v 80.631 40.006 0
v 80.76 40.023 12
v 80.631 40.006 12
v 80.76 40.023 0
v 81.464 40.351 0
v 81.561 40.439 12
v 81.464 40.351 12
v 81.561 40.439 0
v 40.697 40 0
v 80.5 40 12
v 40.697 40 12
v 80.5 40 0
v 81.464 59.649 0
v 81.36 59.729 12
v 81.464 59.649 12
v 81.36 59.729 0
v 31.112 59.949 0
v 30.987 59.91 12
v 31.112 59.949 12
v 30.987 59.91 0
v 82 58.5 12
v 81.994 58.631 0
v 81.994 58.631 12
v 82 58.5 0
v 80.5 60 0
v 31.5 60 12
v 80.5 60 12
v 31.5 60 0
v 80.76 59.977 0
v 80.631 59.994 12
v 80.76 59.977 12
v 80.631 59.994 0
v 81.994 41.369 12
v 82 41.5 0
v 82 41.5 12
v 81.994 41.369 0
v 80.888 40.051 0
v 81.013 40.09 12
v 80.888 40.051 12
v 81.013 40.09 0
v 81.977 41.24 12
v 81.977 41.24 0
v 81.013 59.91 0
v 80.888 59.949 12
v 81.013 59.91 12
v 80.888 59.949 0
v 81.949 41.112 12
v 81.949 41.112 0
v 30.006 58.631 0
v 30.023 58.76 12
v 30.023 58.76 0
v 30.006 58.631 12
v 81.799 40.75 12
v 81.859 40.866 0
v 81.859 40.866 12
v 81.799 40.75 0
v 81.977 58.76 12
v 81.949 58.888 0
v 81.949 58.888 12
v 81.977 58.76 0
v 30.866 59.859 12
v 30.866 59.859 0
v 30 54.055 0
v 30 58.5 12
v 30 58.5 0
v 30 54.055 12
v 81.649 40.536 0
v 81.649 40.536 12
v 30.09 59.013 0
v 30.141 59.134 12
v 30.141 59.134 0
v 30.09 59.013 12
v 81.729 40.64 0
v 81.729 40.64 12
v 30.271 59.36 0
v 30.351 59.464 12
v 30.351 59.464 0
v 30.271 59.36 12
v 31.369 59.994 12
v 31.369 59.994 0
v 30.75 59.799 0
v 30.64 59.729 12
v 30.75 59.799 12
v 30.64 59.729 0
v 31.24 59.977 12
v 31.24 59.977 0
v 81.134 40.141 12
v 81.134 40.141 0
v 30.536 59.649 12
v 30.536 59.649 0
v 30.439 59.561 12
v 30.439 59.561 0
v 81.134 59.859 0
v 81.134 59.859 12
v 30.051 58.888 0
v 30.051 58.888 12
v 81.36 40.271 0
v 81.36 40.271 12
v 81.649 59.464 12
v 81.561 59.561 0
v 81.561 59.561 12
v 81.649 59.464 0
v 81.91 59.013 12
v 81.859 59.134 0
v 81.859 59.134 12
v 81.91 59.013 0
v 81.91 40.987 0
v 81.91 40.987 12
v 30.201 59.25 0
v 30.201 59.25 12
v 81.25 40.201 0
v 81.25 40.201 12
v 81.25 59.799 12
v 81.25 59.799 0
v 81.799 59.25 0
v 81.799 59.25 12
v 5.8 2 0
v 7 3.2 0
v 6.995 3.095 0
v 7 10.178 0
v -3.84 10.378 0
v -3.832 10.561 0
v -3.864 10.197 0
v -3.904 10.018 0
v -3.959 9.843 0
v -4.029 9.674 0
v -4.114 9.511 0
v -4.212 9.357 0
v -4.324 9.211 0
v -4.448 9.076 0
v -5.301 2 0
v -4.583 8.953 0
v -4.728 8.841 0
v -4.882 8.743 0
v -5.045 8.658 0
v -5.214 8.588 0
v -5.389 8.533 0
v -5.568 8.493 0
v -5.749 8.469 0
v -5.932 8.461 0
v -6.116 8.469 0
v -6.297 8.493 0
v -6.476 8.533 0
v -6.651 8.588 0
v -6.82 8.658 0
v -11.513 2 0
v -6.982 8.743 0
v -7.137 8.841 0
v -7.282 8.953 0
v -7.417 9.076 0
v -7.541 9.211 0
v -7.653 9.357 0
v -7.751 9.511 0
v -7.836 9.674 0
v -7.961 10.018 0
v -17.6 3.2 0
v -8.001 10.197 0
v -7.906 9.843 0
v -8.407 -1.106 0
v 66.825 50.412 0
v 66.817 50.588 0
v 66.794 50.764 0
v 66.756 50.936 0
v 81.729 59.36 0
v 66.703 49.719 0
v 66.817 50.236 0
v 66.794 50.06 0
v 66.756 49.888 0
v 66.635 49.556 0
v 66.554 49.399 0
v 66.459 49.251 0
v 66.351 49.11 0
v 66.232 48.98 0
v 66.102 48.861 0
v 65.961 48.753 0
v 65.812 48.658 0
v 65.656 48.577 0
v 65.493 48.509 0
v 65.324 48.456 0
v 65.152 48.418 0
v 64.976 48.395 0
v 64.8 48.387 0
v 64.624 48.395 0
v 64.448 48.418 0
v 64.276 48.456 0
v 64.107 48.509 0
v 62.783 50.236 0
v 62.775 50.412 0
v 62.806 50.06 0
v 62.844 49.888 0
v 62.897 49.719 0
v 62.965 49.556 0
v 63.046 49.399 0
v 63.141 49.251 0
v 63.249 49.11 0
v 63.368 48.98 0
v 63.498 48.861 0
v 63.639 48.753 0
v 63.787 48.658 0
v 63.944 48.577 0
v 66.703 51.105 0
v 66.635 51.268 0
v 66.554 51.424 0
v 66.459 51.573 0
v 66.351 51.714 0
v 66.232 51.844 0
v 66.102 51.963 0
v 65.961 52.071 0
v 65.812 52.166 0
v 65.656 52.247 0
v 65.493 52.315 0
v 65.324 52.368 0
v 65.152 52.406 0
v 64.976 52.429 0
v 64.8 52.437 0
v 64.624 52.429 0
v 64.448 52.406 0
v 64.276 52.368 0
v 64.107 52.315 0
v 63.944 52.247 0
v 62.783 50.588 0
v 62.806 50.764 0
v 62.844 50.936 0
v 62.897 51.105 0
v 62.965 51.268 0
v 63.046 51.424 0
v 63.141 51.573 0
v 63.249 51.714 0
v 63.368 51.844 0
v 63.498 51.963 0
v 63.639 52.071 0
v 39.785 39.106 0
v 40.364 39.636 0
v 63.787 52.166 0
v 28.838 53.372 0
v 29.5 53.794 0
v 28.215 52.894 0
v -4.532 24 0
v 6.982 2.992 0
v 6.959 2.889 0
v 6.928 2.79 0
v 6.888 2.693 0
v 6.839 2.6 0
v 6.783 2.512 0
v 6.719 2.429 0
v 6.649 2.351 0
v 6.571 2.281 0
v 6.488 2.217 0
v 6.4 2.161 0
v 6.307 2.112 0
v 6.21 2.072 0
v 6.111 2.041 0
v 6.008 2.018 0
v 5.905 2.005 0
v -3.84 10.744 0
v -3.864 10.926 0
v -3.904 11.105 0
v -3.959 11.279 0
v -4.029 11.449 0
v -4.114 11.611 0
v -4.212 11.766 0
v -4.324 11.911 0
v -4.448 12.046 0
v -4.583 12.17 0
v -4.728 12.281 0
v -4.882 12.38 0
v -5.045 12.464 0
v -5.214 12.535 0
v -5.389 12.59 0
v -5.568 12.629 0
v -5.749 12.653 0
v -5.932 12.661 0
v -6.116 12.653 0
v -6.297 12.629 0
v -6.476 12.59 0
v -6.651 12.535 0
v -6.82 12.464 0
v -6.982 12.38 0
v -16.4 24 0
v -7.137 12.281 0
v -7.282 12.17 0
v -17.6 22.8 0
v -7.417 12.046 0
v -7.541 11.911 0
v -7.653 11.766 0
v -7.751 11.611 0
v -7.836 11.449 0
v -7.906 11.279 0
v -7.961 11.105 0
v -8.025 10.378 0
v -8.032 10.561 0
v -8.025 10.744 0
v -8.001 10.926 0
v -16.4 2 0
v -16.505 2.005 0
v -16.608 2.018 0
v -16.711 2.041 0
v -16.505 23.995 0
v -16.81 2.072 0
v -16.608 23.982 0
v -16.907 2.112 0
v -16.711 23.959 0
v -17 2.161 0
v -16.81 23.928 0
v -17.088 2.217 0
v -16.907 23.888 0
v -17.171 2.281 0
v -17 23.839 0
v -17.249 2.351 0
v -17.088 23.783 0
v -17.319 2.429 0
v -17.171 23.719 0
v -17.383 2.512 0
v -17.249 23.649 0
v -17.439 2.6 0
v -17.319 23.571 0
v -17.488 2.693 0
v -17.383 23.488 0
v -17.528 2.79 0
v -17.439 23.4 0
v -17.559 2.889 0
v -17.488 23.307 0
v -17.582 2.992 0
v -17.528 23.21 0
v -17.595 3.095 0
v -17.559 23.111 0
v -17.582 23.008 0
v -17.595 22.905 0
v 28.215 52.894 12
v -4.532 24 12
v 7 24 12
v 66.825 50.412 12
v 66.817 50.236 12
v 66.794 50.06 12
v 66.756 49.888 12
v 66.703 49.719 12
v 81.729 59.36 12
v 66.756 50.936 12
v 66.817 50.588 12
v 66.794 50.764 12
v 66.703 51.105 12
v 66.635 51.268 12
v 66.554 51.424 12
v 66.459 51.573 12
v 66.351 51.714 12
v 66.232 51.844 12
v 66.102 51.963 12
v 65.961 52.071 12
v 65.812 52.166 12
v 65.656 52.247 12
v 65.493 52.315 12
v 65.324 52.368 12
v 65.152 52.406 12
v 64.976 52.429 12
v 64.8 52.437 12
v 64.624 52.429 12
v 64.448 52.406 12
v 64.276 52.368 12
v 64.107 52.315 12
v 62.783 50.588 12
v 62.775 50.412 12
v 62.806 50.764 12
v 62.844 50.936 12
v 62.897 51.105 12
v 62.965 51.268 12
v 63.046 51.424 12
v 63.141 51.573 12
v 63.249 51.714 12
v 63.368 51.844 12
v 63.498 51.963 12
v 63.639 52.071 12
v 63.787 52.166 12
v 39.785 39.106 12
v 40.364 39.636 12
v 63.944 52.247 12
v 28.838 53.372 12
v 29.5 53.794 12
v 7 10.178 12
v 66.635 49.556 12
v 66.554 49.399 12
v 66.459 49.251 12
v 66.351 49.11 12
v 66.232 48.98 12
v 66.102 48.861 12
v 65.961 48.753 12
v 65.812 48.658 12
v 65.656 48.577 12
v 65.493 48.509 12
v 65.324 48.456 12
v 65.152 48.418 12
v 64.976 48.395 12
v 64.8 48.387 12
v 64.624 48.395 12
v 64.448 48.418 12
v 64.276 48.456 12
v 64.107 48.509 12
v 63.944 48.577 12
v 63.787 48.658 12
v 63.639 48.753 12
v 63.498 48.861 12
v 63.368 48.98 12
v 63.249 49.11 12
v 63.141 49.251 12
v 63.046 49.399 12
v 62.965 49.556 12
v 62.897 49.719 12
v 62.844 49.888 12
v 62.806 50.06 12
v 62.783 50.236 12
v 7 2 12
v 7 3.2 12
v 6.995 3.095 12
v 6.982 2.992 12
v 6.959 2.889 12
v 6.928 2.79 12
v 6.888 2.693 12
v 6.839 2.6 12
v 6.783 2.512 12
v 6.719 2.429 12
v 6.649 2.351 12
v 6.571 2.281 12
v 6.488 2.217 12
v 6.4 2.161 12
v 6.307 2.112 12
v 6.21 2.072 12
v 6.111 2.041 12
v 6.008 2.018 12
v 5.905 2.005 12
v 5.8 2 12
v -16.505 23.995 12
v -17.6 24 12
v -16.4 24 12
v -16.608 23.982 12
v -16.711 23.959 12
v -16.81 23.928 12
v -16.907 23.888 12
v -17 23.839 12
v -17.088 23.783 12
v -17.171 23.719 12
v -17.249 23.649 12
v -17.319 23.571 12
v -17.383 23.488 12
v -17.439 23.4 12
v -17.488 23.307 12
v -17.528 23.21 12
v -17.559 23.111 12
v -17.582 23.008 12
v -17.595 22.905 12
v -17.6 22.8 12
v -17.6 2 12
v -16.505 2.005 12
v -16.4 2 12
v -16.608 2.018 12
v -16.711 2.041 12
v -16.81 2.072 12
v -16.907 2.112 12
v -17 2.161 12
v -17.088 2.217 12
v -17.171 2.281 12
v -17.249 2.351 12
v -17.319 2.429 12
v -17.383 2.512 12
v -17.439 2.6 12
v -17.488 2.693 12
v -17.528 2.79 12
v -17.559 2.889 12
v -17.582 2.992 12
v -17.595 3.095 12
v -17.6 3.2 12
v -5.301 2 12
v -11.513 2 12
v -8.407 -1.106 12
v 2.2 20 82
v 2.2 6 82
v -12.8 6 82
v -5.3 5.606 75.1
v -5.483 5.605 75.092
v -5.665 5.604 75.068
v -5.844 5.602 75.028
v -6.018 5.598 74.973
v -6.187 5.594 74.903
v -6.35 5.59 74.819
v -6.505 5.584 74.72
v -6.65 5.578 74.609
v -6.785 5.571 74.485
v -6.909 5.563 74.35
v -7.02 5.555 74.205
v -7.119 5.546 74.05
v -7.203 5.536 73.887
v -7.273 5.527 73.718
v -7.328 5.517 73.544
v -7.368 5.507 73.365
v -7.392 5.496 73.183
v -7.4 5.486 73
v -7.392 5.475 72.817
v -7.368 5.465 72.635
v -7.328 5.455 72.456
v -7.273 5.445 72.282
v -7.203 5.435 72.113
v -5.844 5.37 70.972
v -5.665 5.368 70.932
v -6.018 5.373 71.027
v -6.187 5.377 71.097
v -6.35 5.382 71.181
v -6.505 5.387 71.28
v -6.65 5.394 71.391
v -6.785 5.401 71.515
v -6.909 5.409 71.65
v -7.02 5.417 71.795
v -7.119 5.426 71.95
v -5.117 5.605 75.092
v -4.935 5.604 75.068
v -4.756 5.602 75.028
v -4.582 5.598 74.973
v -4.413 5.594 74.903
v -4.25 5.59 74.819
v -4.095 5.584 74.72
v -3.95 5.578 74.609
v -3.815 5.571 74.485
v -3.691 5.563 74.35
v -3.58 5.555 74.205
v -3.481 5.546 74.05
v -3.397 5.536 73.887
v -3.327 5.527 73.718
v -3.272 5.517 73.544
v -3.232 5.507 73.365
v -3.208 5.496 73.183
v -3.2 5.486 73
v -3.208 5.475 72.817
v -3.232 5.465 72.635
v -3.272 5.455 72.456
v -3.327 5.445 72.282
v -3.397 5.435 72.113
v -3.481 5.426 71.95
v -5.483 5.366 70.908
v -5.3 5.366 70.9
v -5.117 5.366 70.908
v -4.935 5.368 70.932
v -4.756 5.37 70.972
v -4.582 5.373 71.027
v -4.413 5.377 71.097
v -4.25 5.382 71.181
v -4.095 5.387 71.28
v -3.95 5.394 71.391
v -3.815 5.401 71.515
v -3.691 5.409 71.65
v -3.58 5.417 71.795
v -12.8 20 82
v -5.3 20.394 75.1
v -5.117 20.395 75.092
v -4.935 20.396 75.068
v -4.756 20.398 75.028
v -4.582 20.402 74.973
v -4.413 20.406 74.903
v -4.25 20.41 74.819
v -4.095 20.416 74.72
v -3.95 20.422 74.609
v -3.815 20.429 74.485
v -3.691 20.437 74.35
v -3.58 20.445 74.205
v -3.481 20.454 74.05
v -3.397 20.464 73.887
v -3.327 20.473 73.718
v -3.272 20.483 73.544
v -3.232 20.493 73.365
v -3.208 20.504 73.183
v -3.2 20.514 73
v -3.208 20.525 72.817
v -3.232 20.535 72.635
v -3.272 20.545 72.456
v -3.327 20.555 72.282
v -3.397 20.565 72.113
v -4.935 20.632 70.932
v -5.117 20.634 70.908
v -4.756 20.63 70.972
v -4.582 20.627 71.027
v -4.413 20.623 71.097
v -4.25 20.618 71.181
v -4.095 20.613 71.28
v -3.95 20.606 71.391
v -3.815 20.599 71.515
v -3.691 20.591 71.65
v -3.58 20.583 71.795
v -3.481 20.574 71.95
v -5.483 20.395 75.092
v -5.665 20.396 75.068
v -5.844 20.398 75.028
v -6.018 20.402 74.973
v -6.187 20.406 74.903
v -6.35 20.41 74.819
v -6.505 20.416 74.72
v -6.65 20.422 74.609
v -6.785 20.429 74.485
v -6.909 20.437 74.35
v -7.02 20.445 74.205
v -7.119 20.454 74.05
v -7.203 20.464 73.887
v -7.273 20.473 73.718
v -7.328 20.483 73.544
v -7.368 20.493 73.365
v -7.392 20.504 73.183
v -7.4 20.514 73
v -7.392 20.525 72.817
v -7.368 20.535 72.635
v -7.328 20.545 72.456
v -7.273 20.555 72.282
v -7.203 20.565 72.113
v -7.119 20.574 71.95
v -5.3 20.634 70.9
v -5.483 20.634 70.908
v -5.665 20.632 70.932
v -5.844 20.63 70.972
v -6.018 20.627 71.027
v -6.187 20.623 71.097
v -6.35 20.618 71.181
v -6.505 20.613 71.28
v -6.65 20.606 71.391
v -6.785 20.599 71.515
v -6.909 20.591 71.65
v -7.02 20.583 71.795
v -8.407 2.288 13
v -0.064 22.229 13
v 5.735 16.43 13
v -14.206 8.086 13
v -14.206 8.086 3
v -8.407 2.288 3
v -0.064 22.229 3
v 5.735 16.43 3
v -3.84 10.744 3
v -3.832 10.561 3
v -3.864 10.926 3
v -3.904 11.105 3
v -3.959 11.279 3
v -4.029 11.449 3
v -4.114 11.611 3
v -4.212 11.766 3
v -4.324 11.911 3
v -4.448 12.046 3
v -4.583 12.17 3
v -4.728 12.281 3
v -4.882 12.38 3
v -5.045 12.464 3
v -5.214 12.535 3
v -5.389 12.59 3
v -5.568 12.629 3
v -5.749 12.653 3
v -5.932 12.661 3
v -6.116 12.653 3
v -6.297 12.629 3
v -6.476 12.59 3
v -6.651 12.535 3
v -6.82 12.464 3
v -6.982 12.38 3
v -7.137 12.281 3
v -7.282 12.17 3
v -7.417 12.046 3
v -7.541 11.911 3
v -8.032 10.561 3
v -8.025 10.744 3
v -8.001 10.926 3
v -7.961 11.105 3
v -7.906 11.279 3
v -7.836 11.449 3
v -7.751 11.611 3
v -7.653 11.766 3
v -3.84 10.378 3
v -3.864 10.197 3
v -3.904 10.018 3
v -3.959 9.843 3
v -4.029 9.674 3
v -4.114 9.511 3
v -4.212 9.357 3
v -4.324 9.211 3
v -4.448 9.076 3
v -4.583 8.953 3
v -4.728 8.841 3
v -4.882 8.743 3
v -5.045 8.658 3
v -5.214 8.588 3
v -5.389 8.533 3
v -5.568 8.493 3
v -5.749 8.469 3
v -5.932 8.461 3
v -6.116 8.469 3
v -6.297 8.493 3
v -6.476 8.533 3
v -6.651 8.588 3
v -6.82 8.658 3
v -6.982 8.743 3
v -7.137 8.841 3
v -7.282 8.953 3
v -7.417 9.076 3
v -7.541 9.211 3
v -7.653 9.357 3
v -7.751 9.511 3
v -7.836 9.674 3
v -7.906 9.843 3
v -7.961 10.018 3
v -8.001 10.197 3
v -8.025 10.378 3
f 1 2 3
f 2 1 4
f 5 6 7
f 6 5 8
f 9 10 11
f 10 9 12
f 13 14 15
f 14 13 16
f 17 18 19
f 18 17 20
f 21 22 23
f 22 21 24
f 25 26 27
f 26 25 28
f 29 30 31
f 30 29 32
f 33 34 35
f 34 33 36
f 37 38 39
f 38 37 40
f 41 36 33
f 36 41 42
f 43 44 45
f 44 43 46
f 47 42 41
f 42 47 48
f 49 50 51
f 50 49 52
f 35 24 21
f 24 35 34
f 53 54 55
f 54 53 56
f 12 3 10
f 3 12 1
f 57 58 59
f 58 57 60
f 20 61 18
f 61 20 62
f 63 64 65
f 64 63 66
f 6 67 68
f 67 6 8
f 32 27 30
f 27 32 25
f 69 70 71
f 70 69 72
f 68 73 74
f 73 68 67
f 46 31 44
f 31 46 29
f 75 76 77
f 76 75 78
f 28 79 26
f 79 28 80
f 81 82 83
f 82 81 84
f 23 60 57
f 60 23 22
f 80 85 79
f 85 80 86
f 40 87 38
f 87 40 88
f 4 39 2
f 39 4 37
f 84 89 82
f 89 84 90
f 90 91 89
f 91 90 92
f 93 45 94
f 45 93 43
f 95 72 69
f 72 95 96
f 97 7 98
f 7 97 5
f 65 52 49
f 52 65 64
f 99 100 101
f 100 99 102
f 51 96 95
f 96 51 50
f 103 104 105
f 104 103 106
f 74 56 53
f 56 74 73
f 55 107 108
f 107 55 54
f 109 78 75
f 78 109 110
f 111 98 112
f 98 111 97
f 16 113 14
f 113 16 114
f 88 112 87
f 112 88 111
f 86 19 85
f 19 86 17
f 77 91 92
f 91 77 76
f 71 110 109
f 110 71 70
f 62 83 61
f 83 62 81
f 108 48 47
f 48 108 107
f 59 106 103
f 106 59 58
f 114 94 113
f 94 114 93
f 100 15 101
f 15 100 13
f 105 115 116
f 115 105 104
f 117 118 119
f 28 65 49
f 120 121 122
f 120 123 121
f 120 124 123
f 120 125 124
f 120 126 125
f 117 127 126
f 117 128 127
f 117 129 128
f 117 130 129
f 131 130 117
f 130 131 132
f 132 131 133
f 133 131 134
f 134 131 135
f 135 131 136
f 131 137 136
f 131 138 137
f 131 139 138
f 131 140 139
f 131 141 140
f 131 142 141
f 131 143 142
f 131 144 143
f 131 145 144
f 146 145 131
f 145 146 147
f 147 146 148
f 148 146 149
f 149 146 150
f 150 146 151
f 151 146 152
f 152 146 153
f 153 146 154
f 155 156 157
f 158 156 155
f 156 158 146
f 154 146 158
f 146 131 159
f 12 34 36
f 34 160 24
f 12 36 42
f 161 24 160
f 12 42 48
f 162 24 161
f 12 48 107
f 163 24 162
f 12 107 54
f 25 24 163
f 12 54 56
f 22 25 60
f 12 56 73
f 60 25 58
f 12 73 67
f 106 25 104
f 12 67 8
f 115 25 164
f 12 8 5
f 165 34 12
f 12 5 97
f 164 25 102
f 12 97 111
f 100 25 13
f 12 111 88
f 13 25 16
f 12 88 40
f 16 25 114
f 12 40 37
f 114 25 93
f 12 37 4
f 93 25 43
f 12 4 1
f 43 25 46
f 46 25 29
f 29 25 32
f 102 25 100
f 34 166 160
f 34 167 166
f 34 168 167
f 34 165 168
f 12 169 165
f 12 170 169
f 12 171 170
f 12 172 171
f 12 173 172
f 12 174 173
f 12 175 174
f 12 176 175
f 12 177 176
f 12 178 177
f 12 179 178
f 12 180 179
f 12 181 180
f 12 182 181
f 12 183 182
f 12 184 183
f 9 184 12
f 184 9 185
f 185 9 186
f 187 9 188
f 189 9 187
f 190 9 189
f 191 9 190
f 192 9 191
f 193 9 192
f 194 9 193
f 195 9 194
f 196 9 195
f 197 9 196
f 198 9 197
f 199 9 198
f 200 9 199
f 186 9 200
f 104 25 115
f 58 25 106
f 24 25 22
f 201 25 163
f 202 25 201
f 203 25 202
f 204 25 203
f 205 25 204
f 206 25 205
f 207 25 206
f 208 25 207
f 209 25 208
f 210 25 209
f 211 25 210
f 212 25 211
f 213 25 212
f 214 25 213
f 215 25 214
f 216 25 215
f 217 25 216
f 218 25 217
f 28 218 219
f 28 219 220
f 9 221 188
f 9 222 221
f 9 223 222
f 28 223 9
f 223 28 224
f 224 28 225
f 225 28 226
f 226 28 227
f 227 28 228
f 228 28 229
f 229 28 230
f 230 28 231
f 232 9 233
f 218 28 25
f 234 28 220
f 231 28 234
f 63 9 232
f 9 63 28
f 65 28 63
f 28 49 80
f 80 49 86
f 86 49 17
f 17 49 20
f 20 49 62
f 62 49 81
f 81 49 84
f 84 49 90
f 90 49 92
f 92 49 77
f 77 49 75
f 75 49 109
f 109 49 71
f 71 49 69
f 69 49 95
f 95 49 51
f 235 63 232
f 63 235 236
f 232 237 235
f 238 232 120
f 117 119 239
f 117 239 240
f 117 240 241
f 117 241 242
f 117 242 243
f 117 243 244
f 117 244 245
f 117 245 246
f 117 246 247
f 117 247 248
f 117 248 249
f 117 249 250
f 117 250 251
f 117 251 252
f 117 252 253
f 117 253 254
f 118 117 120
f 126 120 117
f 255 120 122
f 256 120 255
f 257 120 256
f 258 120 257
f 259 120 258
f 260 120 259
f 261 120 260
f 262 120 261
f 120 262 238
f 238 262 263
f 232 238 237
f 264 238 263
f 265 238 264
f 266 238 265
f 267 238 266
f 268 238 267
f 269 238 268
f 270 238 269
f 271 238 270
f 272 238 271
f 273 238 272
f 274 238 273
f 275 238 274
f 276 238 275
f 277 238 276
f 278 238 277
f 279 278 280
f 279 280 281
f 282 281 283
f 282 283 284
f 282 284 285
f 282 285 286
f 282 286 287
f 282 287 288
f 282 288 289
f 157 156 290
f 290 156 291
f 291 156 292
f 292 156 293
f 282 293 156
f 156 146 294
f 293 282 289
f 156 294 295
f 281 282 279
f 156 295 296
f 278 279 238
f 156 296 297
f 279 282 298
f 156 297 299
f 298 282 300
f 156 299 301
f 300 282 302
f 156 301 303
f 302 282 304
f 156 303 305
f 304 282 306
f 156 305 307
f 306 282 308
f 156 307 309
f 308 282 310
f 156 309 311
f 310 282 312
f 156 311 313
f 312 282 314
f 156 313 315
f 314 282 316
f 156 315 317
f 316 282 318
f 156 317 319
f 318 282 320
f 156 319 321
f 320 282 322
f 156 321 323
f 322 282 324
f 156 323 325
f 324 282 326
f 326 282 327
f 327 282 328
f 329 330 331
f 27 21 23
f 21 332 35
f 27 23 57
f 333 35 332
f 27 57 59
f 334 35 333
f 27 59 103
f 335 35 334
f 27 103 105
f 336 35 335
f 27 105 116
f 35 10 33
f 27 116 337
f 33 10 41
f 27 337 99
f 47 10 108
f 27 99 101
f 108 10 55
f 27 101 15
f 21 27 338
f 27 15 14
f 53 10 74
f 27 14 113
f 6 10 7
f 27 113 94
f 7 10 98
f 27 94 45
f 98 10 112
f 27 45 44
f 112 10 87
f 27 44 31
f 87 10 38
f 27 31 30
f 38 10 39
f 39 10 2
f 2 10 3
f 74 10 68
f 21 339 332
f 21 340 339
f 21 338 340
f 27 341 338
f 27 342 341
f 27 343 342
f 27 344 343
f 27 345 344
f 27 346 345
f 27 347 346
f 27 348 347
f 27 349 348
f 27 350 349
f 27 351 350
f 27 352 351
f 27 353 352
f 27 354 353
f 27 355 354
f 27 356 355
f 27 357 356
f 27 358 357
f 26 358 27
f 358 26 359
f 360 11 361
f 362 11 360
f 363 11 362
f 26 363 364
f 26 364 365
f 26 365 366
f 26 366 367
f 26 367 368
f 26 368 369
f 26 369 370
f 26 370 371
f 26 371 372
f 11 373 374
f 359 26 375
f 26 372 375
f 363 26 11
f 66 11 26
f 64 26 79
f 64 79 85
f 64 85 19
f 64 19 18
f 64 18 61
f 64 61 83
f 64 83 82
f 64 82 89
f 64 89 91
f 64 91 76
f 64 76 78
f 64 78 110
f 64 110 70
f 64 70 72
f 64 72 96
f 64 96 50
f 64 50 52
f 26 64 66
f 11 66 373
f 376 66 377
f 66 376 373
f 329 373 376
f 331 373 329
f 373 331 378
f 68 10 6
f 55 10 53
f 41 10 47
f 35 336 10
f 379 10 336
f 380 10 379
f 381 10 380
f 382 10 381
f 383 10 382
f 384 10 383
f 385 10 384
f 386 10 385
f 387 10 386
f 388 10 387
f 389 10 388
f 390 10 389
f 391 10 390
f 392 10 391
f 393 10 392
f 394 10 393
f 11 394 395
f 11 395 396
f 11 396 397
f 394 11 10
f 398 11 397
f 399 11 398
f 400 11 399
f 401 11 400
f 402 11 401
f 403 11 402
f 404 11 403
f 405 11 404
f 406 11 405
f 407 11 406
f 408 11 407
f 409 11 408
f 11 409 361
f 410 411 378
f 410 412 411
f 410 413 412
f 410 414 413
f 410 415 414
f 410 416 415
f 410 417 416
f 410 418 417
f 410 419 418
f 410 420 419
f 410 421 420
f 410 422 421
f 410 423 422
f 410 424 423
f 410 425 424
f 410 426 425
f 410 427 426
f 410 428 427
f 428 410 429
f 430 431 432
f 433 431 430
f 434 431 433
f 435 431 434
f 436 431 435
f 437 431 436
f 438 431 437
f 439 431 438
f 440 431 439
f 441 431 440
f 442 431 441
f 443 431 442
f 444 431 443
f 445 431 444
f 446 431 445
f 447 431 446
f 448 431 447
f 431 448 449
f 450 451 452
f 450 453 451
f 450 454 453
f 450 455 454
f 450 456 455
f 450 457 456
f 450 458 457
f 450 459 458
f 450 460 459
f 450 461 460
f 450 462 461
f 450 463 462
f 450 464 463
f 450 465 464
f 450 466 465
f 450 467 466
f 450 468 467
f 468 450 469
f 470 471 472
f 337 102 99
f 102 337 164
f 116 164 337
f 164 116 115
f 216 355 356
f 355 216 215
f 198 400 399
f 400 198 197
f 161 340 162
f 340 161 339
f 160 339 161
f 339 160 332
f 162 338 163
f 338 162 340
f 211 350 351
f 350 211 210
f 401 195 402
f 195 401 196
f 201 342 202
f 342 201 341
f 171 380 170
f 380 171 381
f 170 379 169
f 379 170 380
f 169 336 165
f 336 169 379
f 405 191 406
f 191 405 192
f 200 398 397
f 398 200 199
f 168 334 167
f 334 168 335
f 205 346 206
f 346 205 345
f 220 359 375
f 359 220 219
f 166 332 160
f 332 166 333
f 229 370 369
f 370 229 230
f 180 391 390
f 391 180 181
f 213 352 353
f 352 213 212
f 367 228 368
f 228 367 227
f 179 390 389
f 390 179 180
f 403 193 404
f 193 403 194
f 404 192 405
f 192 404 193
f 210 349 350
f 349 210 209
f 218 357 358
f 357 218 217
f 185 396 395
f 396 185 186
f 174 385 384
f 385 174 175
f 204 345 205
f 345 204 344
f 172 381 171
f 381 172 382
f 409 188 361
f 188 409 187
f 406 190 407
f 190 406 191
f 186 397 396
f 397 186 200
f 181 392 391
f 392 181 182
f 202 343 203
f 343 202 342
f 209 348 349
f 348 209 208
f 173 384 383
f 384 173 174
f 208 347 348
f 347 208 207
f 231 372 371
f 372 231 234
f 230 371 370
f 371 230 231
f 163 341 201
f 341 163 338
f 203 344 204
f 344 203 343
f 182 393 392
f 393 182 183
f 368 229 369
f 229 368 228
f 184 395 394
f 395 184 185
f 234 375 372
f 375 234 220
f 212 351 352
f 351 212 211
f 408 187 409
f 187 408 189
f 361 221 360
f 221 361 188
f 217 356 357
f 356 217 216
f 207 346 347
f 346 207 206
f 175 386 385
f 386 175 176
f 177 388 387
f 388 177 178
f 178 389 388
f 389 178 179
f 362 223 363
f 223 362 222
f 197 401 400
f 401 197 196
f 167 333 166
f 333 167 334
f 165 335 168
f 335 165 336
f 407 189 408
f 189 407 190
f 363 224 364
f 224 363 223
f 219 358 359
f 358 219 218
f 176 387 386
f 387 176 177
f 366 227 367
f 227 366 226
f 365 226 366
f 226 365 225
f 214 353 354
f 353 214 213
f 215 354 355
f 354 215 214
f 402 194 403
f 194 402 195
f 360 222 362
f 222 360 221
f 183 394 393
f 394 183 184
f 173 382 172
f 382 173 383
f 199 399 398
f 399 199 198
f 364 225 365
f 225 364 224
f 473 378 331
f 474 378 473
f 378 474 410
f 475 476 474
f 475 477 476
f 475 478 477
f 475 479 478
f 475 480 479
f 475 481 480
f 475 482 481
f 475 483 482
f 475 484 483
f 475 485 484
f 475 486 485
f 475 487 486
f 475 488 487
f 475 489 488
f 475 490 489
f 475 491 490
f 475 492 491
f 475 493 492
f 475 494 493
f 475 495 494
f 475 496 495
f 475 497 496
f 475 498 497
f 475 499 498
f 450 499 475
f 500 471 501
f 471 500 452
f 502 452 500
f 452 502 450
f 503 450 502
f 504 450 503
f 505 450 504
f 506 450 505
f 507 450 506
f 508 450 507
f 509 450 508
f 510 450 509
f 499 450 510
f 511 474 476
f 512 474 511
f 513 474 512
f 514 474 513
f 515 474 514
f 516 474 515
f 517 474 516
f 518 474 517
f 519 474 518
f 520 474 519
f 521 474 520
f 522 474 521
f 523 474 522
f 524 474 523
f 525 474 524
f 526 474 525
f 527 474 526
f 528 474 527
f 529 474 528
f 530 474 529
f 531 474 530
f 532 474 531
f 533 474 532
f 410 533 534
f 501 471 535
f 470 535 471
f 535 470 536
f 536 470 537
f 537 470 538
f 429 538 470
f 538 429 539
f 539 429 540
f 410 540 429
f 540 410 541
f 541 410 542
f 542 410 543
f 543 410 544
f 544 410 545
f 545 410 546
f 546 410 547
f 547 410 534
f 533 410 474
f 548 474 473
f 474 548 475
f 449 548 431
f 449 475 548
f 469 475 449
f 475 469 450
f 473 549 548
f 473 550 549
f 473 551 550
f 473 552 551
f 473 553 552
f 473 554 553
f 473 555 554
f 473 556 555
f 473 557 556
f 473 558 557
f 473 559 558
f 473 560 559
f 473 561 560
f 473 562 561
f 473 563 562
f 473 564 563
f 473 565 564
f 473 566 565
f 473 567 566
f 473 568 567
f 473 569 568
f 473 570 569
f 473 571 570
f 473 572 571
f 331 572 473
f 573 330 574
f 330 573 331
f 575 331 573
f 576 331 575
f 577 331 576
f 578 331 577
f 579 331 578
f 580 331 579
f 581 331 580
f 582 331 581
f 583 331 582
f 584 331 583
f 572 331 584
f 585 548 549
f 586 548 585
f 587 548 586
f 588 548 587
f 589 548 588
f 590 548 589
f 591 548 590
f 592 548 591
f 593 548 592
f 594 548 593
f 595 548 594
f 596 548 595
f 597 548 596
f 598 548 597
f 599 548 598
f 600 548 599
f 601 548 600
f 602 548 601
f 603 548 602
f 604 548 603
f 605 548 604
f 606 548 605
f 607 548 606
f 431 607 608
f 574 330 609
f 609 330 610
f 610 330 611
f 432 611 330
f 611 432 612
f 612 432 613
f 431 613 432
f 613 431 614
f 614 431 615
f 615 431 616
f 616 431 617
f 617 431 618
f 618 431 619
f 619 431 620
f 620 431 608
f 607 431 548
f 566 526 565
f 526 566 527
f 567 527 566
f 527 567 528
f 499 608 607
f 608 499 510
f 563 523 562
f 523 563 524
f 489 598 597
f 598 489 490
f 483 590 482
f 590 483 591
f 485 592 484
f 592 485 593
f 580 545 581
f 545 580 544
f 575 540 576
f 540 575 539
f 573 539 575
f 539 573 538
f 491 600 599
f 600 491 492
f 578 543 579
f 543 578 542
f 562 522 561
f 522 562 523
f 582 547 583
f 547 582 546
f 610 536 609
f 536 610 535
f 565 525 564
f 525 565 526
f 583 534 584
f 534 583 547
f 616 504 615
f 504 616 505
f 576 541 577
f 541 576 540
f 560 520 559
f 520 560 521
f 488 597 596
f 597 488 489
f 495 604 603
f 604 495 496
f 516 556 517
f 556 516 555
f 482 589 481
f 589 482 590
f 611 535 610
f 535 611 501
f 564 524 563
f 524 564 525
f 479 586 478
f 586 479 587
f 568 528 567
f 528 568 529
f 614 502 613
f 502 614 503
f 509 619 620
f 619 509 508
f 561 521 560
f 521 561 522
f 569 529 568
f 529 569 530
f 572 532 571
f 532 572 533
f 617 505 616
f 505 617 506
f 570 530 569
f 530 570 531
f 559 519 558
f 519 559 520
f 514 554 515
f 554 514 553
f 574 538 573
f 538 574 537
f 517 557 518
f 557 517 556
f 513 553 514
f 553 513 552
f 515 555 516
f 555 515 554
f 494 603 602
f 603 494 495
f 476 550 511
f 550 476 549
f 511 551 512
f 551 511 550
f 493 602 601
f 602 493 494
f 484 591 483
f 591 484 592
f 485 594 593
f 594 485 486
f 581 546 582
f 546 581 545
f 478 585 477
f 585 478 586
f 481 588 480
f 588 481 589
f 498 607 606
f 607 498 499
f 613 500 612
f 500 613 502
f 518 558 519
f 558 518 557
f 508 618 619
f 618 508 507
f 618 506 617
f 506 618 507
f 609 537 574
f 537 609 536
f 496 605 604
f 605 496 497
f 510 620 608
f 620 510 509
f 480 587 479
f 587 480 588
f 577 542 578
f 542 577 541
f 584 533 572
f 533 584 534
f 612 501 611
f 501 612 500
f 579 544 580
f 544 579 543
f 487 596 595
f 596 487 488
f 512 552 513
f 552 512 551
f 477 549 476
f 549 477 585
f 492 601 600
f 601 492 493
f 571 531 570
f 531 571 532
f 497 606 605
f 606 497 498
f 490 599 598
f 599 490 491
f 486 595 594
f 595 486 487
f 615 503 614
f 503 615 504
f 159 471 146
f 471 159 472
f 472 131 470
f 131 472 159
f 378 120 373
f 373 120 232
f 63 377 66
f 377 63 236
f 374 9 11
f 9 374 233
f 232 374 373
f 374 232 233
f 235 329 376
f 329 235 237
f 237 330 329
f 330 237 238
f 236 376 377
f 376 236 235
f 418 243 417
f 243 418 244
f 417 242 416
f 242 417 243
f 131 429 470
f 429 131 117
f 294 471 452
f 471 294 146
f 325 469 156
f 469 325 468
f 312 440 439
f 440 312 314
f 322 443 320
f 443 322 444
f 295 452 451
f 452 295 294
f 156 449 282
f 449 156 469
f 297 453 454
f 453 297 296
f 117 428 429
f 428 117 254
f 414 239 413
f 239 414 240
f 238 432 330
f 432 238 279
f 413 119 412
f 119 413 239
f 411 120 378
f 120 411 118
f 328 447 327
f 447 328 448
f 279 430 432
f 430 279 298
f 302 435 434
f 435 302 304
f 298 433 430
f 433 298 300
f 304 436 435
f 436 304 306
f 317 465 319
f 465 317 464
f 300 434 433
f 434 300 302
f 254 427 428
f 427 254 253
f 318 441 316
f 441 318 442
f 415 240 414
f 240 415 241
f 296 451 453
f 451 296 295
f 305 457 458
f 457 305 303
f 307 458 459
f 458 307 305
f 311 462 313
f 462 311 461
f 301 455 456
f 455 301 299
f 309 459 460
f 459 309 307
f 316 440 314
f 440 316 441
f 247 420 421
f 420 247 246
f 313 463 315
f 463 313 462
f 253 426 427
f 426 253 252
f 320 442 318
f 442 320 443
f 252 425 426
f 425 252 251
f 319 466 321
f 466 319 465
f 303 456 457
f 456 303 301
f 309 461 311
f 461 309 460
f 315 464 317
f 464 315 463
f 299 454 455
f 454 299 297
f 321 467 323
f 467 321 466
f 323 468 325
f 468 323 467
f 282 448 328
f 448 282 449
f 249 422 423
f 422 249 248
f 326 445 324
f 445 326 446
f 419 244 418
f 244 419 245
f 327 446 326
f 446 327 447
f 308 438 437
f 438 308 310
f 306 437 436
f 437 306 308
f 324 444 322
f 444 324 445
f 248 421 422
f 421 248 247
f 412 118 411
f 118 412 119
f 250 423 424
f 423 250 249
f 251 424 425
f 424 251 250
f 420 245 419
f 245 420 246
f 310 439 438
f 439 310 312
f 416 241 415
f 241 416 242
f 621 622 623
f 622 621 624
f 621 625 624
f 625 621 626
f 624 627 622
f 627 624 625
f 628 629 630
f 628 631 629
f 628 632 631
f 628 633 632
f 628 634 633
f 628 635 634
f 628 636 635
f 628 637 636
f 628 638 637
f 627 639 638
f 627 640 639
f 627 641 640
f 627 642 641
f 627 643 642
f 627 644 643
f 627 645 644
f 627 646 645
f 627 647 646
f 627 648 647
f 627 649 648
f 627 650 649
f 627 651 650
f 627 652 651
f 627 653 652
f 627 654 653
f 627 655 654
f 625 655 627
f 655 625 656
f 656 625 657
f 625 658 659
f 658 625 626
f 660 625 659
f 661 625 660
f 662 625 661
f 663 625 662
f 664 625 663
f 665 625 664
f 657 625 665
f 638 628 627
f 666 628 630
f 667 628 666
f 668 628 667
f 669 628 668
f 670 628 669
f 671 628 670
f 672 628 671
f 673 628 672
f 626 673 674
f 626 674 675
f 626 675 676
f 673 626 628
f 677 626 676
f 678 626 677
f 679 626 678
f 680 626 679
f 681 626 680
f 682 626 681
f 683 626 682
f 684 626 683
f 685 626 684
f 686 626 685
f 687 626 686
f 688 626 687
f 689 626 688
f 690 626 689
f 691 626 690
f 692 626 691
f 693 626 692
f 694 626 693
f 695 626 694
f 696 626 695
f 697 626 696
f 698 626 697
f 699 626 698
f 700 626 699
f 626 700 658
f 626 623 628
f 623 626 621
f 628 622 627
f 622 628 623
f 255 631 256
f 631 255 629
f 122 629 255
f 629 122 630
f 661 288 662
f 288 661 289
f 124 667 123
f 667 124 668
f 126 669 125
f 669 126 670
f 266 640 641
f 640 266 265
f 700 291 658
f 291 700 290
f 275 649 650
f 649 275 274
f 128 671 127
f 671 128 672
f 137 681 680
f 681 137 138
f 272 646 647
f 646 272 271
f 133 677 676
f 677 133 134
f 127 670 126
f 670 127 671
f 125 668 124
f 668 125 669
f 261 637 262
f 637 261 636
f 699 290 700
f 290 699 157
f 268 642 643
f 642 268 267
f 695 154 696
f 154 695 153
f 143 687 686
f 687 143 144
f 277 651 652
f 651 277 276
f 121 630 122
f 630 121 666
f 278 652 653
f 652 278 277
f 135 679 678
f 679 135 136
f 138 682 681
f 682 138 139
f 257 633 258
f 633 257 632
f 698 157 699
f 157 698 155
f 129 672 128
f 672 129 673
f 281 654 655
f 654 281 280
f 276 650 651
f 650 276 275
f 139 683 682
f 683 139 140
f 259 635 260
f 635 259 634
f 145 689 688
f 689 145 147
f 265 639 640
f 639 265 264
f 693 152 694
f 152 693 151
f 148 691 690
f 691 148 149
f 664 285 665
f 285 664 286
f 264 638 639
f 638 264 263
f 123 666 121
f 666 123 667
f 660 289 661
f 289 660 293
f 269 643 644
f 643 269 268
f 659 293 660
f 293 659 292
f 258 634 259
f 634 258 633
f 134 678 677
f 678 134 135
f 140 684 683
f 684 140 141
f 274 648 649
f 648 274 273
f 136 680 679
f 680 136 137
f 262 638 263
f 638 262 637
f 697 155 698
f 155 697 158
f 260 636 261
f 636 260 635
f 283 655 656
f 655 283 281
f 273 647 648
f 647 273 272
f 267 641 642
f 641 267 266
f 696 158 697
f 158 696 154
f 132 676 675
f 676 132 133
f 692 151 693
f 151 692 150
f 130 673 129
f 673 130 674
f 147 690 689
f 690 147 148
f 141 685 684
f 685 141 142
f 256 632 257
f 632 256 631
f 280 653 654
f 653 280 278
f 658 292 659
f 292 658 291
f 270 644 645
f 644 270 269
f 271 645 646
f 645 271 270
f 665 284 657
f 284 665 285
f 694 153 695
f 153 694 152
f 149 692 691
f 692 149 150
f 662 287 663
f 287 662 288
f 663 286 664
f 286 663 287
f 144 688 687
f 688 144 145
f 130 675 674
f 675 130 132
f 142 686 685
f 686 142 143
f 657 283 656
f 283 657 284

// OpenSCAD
// Support_Cam_PI_IR_Cut_CR6_v6.scad
// Left CR-6 Pi IR-cut camera support bracket, rebuilt parametrically.
//
// This attempt intentionally focuses on the LEFT bracket only.  It does not
// import the STL.  v6 rebuilds the lower printer foot as the original channel/tray shape
// shown in the reference image, including walls, open pocket, and screw hole.

/* [Left Bracket Dimensions] */
base_z = 0;
base_thickness = 12;
diagonal_arm_width = 18;
diagonal_arm_start = [0, 16];
diagonal_arm_end = [34, 46];
camera_tab_origin = [30, 40, 0];
camera_tab_size = [52, 20, 12];
camera_hole_xy = [64.8, 50.412];
camera_hole_diameter = 4.05;
foot_center = [-5.9325, 10.56125];
foot_outer_size = [20, 13, 12];
foot_rotation = 45;
foot_wall = 2.4;
foot_floor = 3;
foot_mount_hole_diameter = 4.2;

/* [Tower] */
tower_origin = [-17.6, 2, 12];
tower_bottom_size = [24.6, 22];
tower_top_size = [15, 14];
tower_height = 70;
tower_hole_y = 13;
tower_hole_z = 73;
tower_hole_diameter = 4.2;

/* [Preview] */
preview_color = true;
$fn = 72;

module maybe_color() {
    if (preview_color) color("palegreen") children();
    else children();
}

module bar_between(a, b, width, height) {
    hull() {
        translate([a[0], a[1], base_z]) cylinder(h = height, d = width);
        translate([b[0], b[1], base_z]) cylinder(h = height, d = width);
    }
}

module rounded_rect(size, radius = 1.5) {
    hull() {
        for (x = [radius, size[0] - radius])
            for (y = [radius, size[1] - radius])
                translate([x, y, 0]) cylinder(h = size[2], r = radius);
    }
}

module tapered_tower(origin, bottom_size, top_size, height) {
    bx = bottom_size[0];
    by = bottom_size[1];
    tx = top_size[0];
    ty = top_size[1];
    ox = (bx - tx) / 2;
    oy = (by - ty) / 2;

    translate(origin)
        polyhedron(
            points = [
                [0, 0, 0], [bx, 0, 0], [bx, by, 0], [0, by, 0],
                [ox, oy, height], [ox + tx, oy, height], [ox + tx, oy + ty, height], [ox, oy + ty, height]
            ],
            faces = [
                [0, 1, 2, 3], [4, 7, 6, 5],
                [0, 4, 5, 1], [1, 5, 6, 2],
                [2, 6, 7, 3], [3, 7, 4, 0]
            ]
        );
}

module tower_with_hole() {
    difference() {
        tapered_tower(tower_origin, tower_bottom_size, tower_top_size, tower_height);
        translate([tower_origin[0] + tower_bottom_size[0] / 2, tower_hole_y, tower_hole_z])
            rotate([90, 0, 0])
                cylinder(h = tower_bottom_size[1] + 4, d = tower_hole_diameter, center = true);
    }
}

module camera_tab() {
    difference() {
        translate(camera_tab_origin) rounded_rect(camera_tab_size, 1.5);
        translate([camera_hole_xy[0], camera_hole_xy[1], camera_tab_origin[2] - 0.5])
            cylinder(h = camera_tab_size[2] + 1, d = camera_hole_diameter);
    }
}

module lower_foot() {
    // Outer channel/tray foot, rotated to match the measured footprint.
    translate([foot_center[0], foot_center[1], base_z])
        rotate([0, 0, foot_rotation])
            translate([-foot_outer_size[0] / 2, -foot_outer_size[1] / 2, 0])
                cube(foot_outer_size);
}

module lower_foot_pocket_cut() {
    // Hollow pocket leaves the floor, side walls, and the closed back wall visible in the reference image.
    translate([foot_center[0], foot_center[1], base_z + foot_floor])
        rotate([0, 0, foot_rotation])
            translate([-foot_outer_size[0] / 2 + foot_wall, -foot_outer_size[1] / 2 + foot_wall, 0])
                cube([foot_outer_size[0], foot_outer_size[1] - 2 * foot_wall, foot_outer_size[2] - foot_floor + 1]);
}

module lower_foot_hole_cut() {
    translate([foot_center[0], foot_center[1], base_z - 0.5])
        cylinder(h = foot_floor + 1, d = foot_mount_hole_diameter);
}



module left_bracket() {
    maybe_color()
        difference() {
            union() {
                // Continuous lower assembly: measured lower foot, diagonal arm, camera tab, and tower pad overlap.
                lower_foot();
                bar_between(diagonal_arm_start, diagonal_arm_end, diagonal_arm_width, base_thickness);
                camera_tab();
                translate([tower_origin[0], tower_origin[1], base_z])
                    rounded_rect([tower_bottom_size[0], tower_bottom_size[1], base_thickness], 1.2);

                // The measured left STL has a tall tapered upright directly on the tower pad.
                tower_with_hole();
            }

            // Re-cut these through the whole assembly so the arm cannot fill the tray pocket.
            lower_foot_pocket_cut();
            lower_foot_hole_cut();
        }
}

left_bracket();
